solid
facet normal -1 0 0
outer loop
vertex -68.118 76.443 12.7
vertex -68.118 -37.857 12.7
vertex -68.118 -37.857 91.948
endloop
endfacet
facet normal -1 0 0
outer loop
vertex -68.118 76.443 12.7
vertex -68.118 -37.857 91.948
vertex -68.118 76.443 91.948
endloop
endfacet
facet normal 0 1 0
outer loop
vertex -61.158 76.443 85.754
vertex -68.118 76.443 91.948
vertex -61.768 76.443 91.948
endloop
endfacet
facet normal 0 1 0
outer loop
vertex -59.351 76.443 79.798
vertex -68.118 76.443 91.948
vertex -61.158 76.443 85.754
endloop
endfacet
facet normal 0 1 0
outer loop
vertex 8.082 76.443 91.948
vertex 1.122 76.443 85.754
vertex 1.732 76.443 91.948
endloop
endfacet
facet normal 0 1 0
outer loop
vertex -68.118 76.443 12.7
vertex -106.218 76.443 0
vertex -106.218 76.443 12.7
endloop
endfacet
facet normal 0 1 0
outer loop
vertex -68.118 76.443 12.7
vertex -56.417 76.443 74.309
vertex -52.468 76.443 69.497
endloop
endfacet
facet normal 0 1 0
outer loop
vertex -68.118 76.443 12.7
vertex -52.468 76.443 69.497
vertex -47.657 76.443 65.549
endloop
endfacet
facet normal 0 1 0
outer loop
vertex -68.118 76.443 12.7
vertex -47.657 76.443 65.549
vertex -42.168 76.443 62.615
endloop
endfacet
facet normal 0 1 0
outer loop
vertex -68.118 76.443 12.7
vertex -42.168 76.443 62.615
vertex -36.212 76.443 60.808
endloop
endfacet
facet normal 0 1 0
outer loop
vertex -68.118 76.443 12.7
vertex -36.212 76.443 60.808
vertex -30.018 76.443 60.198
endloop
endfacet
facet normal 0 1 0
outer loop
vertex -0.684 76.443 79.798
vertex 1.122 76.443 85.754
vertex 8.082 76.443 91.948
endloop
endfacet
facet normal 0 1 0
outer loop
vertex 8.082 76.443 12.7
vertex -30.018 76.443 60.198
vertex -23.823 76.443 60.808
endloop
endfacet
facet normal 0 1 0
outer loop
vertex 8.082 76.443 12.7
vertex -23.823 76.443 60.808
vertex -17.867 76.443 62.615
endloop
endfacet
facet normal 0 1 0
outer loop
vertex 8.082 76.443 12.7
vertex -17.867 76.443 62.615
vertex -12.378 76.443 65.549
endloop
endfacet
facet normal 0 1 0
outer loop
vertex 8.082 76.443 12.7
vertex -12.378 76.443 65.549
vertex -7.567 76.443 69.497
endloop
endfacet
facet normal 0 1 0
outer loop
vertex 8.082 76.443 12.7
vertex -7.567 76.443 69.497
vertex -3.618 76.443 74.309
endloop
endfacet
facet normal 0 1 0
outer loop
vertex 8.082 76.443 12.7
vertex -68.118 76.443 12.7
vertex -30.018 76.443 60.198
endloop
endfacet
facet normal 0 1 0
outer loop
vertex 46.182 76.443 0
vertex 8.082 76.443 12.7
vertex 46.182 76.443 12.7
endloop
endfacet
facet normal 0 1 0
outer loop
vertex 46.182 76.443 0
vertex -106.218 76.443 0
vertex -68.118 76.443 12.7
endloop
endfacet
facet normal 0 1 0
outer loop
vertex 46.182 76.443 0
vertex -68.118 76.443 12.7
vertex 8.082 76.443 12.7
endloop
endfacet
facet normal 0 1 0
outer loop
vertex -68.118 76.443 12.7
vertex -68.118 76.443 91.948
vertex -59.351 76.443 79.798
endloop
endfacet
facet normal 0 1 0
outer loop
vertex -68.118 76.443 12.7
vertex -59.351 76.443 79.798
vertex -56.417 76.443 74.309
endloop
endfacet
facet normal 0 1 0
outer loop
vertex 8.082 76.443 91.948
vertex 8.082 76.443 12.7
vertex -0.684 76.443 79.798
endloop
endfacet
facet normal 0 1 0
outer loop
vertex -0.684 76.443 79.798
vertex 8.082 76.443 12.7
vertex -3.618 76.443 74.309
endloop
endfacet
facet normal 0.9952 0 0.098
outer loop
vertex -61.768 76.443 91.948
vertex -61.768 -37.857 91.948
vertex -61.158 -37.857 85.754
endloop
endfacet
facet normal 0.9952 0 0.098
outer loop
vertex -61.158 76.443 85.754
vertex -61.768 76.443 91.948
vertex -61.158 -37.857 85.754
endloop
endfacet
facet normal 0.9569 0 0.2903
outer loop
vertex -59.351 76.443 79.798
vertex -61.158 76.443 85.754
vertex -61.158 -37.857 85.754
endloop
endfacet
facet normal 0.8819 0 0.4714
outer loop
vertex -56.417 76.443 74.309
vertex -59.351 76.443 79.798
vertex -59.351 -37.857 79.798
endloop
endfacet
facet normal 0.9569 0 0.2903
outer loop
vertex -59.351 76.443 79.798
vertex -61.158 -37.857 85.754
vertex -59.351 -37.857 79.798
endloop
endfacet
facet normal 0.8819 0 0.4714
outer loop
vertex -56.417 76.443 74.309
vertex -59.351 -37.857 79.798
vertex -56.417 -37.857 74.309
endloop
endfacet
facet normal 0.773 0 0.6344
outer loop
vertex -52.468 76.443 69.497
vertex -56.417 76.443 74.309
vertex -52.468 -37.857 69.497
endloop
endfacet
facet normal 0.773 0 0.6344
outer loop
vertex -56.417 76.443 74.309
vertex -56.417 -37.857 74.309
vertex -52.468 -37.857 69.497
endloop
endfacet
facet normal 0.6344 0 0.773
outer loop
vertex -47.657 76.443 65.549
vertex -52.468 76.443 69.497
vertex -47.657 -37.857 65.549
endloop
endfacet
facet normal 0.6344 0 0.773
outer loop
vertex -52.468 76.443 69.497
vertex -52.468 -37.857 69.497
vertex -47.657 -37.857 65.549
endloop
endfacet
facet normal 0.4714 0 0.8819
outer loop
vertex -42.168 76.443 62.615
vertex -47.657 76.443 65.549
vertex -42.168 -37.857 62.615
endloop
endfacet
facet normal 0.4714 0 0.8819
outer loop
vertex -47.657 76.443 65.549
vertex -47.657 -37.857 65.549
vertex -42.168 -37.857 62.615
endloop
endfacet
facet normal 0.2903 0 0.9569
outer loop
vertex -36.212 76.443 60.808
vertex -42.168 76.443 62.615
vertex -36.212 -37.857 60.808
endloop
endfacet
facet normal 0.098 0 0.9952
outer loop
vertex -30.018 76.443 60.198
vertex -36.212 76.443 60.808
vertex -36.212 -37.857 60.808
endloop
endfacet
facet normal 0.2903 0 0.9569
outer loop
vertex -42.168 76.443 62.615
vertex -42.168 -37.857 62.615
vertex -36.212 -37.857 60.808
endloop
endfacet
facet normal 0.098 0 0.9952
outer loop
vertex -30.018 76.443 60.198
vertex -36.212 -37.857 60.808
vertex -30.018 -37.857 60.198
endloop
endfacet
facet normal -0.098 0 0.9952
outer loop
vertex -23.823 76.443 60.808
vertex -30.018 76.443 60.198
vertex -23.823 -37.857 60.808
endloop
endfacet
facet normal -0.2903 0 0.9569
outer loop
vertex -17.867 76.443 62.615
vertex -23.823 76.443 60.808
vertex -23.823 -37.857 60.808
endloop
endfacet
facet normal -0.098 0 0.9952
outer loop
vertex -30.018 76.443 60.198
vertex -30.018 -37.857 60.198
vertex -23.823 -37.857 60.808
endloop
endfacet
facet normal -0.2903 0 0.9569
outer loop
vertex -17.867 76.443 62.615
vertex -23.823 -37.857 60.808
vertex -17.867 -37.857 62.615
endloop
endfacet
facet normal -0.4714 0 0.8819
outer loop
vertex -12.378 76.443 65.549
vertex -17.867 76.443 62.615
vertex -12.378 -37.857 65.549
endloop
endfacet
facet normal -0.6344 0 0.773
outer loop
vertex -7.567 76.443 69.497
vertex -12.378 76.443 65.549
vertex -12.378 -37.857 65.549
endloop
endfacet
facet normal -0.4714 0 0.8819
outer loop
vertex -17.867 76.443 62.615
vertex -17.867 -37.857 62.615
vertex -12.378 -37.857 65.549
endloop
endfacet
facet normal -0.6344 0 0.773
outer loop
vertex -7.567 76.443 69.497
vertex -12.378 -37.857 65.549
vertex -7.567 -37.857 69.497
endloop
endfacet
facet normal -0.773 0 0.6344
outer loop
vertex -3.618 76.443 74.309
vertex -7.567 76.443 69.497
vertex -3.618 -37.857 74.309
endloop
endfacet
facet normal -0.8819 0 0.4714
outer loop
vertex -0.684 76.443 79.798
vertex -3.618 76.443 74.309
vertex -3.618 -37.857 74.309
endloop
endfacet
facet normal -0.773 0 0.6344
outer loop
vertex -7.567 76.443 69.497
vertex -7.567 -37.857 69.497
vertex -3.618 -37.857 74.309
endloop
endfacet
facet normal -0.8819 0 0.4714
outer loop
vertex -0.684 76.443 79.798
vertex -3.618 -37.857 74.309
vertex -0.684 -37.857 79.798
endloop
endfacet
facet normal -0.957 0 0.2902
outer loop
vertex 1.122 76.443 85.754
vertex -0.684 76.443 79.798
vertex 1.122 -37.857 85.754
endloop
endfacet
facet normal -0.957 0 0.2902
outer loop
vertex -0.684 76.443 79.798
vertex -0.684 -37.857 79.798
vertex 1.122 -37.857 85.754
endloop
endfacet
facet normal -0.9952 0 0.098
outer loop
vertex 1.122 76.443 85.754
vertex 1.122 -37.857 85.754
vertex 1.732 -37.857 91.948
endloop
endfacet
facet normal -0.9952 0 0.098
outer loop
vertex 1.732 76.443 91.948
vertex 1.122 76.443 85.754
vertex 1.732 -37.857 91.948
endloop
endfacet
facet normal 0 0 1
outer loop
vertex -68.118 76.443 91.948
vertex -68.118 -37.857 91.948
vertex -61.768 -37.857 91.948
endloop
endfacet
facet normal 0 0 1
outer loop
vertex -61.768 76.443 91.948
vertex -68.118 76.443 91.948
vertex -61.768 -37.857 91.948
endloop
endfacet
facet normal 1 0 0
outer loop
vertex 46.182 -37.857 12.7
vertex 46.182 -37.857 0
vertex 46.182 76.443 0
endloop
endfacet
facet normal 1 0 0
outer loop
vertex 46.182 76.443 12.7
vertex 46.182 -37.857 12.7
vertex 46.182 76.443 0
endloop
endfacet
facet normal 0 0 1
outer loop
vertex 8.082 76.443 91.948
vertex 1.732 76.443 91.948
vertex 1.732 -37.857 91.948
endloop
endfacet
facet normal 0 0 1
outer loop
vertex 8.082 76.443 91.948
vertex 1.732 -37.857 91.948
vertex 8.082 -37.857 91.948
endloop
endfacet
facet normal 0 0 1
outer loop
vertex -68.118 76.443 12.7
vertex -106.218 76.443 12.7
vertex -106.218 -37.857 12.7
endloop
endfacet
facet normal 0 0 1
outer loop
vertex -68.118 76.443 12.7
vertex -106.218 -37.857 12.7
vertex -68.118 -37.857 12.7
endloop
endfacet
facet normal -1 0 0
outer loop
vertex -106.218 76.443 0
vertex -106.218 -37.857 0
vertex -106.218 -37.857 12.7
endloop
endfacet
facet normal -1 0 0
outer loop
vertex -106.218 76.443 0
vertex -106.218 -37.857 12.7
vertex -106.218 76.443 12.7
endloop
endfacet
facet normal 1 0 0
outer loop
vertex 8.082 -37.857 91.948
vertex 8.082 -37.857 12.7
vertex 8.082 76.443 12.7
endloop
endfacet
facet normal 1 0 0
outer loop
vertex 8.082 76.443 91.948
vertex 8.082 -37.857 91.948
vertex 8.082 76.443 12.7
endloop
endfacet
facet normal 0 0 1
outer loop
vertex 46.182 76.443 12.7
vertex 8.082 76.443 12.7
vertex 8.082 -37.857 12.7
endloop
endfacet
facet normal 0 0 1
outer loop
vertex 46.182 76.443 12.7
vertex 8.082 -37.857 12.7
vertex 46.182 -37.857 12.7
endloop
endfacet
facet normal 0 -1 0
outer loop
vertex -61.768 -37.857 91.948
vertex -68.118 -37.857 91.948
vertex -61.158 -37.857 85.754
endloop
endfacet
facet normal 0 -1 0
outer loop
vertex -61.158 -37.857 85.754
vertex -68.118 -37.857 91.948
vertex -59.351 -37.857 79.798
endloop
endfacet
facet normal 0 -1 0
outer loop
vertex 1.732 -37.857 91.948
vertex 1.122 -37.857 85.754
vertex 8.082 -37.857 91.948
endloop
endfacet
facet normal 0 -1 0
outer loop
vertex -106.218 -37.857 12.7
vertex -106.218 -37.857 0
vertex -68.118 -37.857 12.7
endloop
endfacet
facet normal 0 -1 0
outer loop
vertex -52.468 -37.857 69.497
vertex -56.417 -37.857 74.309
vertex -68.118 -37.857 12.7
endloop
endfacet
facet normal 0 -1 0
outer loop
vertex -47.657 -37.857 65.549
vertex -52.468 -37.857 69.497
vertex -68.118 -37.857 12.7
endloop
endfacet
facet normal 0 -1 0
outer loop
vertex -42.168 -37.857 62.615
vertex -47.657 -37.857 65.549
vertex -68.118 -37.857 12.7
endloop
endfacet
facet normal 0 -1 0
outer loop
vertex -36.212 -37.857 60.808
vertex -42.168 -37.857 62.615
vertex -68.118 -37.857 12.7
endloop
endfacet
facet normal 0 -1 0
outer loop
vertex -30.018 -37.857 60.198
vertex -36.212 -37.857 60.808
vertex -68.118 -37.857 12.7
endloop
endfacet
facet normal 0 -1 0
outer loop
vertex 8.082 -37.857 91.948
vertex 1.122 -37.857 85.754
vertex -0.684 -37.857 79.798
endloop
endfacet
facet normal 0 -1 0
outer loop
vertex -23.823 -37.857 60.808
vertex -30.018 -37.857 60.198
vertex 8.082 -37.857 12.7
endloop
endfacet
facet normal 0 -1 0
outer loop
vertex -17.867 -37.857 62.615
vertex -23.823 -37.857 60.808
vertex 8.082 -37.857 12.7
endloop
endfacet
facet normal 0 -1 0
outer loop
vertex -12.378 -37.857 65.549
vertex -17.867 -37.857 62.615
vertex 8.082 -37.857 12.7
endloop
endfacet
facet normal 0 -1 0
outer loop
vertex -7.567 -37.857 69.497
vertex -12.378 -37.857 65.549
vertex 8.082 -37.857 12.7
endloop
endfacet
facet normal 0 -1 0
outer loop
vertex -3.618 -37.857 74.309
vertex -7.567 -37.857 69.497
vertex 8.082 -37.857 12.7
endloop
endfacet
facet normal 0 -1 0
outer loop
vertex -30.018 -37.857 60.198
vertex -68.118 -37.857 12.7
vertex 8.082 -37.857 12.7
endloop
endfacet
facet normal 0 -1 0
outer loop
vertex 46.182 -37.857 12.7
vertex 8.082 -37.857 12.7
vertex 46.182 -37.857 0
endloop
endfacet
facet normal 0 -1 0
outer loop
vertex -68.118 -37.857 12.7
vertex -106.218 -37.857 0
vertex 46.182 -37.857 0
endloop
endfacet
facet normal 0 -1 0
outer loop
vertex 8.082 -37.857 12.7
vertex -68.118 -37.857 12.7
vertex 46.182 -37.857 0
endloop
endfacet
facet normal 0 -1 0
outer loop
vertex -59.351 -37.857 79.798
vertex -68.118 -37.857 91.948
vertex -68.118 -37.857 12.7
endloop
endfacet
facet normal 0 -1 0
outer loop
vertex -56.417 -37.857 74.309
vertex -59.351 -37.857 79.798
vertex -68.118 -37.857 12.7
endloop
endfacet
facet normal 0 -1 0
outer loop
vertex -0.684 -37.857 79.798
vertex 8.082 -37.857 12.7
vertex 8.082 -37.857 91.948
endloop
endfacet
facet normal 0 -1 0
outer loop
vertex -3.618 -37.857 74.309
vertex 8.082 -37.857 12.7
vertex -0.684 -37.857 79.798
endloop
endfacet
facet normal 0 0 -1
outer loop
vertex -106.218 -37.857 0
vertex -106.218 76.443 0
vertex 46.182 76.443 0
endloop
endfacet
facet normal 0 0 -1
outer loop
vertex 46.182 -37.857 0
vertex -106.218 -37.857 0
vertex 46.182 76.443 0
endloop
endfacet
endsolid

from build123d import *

# Parameters (mm, degrees)
F0_W     = 152.4
F0_H     = 114.3
F1_DEPTH = 12.7
F2_W     = 76.2
F2_H     = 114.3
F3_DEPTH = 79.248
F4_R     = 31.75
F5_DEPTH = 114.301


with BuildPart() as f1:
    # F0 (on Top) → F1 (new body)
    with BuildSketch(Plane.XY):
        with Locations((-30.01758, 19.292982)):
            Rectangle(F0_W, F0_H)
    extrude(amount=F1_DEPTH)

    # F2 (on face) → F3 (join)
    with BuildSketch(Plane.XY.offset(12.7)):
        with Locations((-30.01758, 19.292982)):
            Rectangle(F2_W, F2_H)
    extrude(amount=F3_DEPTH)

    # F4 (on face) → F5 (cut, through all)
    with BuildSketch(Plane.XZ.offset(37.857018)):
        with Locations((-30.01758, 91.948)):
            Circle(F4_R)
    extrude(amount=-F5_DEPTH, mode=Mode.SUBTRACT)


solid = f1.part
